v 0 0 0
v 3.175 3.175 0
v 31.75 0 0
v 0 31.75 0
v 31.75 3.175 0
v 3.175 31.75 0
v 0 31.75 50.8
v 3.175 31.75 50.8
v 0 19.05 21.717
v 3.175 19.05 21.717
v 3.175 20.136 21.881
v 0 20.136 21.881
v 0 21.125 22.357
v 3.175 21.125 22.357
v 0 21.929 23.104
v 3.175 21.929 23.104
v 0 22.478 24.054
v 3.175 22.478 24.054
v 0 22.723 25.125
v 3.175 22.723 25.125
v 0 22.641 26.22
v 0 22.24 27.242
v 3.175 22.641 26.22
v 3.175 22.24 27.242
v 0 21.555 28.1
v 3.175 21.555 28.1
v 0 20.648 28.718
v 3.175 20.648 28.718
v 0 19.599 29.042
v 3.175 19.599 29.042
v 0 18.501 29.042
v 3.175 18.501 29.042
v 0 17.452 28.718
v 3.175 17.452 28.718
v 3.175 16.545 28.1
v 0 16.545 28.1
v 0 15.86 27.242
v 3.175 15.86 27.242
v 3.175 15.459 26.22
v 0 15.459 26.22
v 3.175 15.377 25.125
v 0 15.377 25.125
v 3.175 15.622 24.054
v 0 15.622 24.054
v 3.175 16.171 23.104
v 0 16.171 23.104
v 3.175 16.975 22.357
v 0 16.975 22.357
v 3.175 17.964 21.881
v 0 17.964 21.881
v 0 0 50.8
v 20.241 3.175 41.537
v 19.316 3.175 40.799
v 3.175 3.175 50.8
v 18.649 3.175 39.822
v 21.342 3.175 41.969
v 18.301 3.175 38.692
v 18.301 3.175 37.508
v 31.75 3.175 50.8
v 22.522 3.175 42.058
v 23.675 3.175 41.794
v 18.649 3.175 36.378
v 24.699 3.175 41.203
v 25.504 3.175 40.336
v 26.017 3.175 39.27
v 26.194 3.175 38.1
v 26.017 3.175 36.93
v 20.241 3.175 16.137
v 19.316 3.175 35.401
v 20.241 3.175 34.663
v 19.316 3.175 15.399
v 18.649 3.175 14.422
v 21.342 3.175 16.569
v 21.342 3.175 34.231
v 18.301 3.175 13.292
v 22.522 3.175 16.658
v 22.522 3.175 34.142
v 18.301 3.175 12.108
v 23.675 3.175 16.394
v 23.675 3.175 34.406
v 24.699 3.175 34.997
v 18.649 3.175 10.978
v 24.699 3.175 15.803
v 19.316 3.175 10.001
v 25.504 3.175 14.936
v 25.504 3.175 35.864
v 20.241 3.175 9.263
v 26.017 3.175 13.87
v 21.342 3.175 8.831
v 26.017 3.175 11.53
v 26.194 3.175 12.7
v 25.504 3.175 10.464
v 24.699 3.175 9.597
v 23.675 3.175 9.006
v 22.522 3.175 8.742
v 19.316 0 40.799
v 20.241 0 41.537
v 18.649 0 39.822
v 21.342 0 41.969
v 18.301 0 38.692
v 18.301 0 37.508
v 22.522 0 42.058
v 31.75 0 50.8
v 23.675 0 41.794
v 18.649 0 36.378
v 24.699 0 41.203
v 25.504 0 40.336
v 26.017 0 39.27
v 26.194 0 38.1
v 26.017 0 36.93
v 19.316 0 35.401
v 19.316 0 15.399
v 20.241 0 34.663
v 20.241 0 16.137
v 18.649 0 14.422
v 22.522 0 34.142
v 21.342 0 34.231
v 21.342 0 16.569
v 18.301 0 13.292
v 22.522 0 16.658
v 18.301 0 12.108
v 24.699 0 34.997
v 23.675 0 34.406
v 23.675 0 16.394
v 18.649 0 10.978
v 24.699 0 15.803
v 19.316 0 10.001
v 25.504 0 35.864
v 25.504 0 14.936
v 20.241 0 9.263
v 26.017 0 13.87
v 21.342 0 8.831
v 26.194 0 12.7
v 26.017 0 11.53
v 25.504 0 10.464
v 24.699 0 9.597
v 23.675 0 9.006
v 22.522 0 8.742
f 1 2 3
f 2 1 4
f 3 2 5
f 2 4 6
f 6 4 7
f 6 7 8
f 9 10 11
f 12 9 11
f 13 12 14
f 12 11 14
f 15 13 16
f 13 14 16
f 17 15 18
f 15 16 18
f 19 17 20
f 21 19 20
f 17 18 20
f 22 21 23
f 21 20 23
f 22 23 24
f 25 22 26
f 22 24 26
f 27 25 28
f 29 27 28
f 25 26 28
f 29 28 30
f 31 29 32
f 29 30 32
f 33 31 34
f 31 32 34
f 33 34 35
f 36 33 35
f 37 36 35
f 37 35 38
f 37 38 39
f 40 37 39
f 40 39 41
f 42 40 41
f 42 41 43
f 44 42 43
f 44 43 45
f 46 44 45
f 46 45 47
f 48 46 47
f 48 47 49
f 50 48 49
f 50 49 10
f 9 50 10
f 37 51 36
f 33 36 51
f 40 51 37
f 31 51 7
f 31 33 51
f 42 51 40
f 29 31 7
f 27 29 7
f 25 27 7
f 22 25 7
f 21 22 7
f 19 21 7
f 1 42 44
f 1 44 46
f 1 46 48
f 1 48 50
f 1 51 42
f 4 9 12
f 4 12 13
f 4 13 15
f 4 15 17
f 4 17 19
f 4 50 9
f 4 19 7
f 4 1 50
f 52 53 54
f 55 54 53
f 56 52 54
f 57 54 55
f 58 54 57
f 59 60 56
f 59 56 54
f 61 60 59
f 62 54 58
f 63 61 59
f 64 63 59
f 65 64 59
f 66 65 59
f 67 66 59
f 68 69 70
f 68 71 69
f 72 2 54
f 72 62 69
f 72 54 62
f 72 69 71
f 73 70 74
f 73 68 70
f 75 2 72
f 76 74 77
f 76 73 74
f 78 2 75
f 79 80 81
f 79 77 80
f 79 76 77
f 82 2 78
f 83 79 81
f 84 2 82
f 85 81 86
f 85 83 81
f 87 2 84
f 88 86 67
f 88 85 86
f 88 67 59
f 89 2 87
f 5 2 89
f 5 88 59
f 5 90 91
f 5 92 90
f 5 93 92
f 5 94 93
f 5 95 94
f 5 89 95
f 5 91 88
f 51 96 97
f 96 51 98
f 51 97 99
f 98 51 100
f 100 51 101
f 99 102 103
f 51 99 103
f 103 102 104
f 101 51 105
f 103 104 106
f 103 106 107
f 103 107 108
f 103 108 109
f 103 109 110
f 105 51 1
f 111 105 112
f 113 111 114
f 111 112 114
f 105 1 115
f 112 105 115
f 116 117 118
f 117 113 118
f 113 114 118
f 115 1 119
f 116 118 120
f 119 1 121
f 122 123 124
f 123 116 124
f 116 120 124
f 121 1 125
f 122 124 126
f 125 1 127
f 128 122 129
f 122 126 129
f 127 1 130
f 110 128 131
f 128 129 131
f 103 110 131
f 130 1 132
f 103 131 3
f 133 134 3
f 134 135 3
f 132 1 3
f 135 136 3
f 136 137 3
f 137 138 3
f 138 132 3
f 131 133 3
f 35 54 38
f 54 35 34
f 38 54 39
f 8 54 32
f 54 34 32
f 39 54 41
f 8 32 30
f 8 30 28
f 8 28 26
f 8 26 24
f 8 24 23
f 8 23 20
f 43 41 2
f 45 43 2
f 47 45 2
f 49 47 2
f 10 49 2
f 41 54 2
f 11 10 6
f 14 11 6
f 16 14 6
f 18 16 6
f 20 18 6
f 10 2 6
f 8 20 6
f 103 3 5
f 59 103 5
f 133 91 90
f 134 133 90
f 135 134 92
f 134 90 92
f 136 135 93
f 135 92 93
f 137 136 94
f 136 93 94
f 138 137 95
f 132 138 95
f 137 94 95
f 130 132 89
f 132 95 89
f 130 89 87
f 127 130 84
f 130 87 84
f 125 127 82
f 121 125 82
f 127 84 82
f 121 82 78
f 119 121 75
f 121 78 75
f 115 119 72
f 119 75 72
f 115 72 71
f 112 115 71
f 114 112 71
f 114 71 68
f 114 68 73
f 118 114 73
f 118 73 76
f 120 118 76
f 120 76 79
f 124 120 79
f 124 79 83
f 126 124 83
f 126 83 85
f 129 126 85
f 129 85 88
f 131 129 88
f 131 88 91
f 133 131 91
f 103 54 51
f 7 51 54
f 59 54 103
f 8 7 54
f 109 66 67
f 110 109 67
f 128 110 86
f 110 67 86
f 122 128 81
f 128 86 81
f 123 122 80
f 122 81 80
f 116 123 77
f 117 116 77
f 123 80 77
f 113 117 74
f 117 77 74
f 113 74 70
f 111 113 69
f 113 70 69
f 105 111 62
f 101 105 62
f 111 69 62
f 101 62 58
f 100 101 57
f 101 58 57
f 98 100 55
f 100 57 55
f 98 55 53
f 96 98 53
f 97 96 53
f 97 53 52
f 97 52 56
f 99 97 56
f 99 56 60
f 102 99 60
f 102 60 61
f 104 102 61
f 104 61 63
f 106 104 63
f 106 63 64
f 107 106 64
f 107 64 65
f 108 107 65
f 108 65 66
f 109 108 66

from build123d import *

# Parameters (mm, degrees)
SKETCH1_W           = 3.175
SKETCH1_H           = 31.75
SKETCH1_W_2         = 28.575
SKETCH1_H_2         = 3.175
BOSS_EXTRUDE1_DEPTH = 50.8
POT_MOUNT_REACH     = 5.175
SKETCH2_R           = 3.683
BASE_MOUNT_REACH    = 5.175
SKETCH3_R           = 3.96875


with BuildPart() as part:
    # Sketch1 → Boss-Extrude1 (new body)
    with BuildSketch(Plane.XY):
        with Locations((1.5875, 15.875)):
            Rectangle(SKETCH1_W, SKETCH1_H)
        with Locations((17.4625, 1.5875)):
            Rectangle(SKETCH1_W_2, SKETCH1_H_2)
    extrude(amount=BOSS_EXTRUDE1_DEPTH)

    # Sketch2 → Pot Mount (cut, up to next)
    with BuildSketch(Plane(origin=(3.175, 0, 0), x_dir=(0, 0, -1), z_dir=(1, 0, 0)), mode=Mode.PRIVATE) as pot_mount_sk1:
        with Locations((-25.4, 19.05)):
            Circle(SKETCH2_R)
    pot_mount_tool1 = extrude(pot_mount_sk1.sketch, amount=-POT_MOUNT_REACH, mode=Mode.PRIVATE) & part.part
    add(pot_mount_tool1.solids().sort_by_distance((3.175, 19.05, 25.4))[0], mode=Mode.SUBTRACT)

    # Sketch3 → Base Mount (cut, up to next)
    with BuildSketch(Plane(origin=(0, 3.175, 0), x_dir=(1, 0, 0), z_dir=(0, 1, 0)), mode=Mode.PRIVATE) as base_mount_sk1:
        with Locations((22.225, -38.1)):
            Circle(SKETCH3_R)
    base_mount_tool1 = extrude(base_mount_sk1.sketch, amount=-BASE_MOUNT_REACH, mode=Mode.PRIVATE) & part.part
    add(base_mount_tool1.solids().sort_by_distance((22.225, 3.175, 38.1))[0], mode=Mode.SUBTRACT)
    # Sketch3 → Base Mount (cut, up to next)
    with BuildSketch(Plane(origin=(0, 3.175, 0), x_dir=(1, 0, 0), z_dir=(0, 1, 0)), mode=Mode.PRIVATE) as base_mount_sk2:
        with Locations((22.225, -12.7)):
            Circle(SKETCH3_R)
    base_mount_tool2 = extrude(base_mount_sk2.sketch, amount=-BASE_MOUNT_REACH, mode=Mode.PRIVATE) & part.part
    add(base_mount_tool2.solids().sort_by_distance((22.225, 3.175, 12.7))[0], mode=Mode.SUBTRACT)


solid = part.part
